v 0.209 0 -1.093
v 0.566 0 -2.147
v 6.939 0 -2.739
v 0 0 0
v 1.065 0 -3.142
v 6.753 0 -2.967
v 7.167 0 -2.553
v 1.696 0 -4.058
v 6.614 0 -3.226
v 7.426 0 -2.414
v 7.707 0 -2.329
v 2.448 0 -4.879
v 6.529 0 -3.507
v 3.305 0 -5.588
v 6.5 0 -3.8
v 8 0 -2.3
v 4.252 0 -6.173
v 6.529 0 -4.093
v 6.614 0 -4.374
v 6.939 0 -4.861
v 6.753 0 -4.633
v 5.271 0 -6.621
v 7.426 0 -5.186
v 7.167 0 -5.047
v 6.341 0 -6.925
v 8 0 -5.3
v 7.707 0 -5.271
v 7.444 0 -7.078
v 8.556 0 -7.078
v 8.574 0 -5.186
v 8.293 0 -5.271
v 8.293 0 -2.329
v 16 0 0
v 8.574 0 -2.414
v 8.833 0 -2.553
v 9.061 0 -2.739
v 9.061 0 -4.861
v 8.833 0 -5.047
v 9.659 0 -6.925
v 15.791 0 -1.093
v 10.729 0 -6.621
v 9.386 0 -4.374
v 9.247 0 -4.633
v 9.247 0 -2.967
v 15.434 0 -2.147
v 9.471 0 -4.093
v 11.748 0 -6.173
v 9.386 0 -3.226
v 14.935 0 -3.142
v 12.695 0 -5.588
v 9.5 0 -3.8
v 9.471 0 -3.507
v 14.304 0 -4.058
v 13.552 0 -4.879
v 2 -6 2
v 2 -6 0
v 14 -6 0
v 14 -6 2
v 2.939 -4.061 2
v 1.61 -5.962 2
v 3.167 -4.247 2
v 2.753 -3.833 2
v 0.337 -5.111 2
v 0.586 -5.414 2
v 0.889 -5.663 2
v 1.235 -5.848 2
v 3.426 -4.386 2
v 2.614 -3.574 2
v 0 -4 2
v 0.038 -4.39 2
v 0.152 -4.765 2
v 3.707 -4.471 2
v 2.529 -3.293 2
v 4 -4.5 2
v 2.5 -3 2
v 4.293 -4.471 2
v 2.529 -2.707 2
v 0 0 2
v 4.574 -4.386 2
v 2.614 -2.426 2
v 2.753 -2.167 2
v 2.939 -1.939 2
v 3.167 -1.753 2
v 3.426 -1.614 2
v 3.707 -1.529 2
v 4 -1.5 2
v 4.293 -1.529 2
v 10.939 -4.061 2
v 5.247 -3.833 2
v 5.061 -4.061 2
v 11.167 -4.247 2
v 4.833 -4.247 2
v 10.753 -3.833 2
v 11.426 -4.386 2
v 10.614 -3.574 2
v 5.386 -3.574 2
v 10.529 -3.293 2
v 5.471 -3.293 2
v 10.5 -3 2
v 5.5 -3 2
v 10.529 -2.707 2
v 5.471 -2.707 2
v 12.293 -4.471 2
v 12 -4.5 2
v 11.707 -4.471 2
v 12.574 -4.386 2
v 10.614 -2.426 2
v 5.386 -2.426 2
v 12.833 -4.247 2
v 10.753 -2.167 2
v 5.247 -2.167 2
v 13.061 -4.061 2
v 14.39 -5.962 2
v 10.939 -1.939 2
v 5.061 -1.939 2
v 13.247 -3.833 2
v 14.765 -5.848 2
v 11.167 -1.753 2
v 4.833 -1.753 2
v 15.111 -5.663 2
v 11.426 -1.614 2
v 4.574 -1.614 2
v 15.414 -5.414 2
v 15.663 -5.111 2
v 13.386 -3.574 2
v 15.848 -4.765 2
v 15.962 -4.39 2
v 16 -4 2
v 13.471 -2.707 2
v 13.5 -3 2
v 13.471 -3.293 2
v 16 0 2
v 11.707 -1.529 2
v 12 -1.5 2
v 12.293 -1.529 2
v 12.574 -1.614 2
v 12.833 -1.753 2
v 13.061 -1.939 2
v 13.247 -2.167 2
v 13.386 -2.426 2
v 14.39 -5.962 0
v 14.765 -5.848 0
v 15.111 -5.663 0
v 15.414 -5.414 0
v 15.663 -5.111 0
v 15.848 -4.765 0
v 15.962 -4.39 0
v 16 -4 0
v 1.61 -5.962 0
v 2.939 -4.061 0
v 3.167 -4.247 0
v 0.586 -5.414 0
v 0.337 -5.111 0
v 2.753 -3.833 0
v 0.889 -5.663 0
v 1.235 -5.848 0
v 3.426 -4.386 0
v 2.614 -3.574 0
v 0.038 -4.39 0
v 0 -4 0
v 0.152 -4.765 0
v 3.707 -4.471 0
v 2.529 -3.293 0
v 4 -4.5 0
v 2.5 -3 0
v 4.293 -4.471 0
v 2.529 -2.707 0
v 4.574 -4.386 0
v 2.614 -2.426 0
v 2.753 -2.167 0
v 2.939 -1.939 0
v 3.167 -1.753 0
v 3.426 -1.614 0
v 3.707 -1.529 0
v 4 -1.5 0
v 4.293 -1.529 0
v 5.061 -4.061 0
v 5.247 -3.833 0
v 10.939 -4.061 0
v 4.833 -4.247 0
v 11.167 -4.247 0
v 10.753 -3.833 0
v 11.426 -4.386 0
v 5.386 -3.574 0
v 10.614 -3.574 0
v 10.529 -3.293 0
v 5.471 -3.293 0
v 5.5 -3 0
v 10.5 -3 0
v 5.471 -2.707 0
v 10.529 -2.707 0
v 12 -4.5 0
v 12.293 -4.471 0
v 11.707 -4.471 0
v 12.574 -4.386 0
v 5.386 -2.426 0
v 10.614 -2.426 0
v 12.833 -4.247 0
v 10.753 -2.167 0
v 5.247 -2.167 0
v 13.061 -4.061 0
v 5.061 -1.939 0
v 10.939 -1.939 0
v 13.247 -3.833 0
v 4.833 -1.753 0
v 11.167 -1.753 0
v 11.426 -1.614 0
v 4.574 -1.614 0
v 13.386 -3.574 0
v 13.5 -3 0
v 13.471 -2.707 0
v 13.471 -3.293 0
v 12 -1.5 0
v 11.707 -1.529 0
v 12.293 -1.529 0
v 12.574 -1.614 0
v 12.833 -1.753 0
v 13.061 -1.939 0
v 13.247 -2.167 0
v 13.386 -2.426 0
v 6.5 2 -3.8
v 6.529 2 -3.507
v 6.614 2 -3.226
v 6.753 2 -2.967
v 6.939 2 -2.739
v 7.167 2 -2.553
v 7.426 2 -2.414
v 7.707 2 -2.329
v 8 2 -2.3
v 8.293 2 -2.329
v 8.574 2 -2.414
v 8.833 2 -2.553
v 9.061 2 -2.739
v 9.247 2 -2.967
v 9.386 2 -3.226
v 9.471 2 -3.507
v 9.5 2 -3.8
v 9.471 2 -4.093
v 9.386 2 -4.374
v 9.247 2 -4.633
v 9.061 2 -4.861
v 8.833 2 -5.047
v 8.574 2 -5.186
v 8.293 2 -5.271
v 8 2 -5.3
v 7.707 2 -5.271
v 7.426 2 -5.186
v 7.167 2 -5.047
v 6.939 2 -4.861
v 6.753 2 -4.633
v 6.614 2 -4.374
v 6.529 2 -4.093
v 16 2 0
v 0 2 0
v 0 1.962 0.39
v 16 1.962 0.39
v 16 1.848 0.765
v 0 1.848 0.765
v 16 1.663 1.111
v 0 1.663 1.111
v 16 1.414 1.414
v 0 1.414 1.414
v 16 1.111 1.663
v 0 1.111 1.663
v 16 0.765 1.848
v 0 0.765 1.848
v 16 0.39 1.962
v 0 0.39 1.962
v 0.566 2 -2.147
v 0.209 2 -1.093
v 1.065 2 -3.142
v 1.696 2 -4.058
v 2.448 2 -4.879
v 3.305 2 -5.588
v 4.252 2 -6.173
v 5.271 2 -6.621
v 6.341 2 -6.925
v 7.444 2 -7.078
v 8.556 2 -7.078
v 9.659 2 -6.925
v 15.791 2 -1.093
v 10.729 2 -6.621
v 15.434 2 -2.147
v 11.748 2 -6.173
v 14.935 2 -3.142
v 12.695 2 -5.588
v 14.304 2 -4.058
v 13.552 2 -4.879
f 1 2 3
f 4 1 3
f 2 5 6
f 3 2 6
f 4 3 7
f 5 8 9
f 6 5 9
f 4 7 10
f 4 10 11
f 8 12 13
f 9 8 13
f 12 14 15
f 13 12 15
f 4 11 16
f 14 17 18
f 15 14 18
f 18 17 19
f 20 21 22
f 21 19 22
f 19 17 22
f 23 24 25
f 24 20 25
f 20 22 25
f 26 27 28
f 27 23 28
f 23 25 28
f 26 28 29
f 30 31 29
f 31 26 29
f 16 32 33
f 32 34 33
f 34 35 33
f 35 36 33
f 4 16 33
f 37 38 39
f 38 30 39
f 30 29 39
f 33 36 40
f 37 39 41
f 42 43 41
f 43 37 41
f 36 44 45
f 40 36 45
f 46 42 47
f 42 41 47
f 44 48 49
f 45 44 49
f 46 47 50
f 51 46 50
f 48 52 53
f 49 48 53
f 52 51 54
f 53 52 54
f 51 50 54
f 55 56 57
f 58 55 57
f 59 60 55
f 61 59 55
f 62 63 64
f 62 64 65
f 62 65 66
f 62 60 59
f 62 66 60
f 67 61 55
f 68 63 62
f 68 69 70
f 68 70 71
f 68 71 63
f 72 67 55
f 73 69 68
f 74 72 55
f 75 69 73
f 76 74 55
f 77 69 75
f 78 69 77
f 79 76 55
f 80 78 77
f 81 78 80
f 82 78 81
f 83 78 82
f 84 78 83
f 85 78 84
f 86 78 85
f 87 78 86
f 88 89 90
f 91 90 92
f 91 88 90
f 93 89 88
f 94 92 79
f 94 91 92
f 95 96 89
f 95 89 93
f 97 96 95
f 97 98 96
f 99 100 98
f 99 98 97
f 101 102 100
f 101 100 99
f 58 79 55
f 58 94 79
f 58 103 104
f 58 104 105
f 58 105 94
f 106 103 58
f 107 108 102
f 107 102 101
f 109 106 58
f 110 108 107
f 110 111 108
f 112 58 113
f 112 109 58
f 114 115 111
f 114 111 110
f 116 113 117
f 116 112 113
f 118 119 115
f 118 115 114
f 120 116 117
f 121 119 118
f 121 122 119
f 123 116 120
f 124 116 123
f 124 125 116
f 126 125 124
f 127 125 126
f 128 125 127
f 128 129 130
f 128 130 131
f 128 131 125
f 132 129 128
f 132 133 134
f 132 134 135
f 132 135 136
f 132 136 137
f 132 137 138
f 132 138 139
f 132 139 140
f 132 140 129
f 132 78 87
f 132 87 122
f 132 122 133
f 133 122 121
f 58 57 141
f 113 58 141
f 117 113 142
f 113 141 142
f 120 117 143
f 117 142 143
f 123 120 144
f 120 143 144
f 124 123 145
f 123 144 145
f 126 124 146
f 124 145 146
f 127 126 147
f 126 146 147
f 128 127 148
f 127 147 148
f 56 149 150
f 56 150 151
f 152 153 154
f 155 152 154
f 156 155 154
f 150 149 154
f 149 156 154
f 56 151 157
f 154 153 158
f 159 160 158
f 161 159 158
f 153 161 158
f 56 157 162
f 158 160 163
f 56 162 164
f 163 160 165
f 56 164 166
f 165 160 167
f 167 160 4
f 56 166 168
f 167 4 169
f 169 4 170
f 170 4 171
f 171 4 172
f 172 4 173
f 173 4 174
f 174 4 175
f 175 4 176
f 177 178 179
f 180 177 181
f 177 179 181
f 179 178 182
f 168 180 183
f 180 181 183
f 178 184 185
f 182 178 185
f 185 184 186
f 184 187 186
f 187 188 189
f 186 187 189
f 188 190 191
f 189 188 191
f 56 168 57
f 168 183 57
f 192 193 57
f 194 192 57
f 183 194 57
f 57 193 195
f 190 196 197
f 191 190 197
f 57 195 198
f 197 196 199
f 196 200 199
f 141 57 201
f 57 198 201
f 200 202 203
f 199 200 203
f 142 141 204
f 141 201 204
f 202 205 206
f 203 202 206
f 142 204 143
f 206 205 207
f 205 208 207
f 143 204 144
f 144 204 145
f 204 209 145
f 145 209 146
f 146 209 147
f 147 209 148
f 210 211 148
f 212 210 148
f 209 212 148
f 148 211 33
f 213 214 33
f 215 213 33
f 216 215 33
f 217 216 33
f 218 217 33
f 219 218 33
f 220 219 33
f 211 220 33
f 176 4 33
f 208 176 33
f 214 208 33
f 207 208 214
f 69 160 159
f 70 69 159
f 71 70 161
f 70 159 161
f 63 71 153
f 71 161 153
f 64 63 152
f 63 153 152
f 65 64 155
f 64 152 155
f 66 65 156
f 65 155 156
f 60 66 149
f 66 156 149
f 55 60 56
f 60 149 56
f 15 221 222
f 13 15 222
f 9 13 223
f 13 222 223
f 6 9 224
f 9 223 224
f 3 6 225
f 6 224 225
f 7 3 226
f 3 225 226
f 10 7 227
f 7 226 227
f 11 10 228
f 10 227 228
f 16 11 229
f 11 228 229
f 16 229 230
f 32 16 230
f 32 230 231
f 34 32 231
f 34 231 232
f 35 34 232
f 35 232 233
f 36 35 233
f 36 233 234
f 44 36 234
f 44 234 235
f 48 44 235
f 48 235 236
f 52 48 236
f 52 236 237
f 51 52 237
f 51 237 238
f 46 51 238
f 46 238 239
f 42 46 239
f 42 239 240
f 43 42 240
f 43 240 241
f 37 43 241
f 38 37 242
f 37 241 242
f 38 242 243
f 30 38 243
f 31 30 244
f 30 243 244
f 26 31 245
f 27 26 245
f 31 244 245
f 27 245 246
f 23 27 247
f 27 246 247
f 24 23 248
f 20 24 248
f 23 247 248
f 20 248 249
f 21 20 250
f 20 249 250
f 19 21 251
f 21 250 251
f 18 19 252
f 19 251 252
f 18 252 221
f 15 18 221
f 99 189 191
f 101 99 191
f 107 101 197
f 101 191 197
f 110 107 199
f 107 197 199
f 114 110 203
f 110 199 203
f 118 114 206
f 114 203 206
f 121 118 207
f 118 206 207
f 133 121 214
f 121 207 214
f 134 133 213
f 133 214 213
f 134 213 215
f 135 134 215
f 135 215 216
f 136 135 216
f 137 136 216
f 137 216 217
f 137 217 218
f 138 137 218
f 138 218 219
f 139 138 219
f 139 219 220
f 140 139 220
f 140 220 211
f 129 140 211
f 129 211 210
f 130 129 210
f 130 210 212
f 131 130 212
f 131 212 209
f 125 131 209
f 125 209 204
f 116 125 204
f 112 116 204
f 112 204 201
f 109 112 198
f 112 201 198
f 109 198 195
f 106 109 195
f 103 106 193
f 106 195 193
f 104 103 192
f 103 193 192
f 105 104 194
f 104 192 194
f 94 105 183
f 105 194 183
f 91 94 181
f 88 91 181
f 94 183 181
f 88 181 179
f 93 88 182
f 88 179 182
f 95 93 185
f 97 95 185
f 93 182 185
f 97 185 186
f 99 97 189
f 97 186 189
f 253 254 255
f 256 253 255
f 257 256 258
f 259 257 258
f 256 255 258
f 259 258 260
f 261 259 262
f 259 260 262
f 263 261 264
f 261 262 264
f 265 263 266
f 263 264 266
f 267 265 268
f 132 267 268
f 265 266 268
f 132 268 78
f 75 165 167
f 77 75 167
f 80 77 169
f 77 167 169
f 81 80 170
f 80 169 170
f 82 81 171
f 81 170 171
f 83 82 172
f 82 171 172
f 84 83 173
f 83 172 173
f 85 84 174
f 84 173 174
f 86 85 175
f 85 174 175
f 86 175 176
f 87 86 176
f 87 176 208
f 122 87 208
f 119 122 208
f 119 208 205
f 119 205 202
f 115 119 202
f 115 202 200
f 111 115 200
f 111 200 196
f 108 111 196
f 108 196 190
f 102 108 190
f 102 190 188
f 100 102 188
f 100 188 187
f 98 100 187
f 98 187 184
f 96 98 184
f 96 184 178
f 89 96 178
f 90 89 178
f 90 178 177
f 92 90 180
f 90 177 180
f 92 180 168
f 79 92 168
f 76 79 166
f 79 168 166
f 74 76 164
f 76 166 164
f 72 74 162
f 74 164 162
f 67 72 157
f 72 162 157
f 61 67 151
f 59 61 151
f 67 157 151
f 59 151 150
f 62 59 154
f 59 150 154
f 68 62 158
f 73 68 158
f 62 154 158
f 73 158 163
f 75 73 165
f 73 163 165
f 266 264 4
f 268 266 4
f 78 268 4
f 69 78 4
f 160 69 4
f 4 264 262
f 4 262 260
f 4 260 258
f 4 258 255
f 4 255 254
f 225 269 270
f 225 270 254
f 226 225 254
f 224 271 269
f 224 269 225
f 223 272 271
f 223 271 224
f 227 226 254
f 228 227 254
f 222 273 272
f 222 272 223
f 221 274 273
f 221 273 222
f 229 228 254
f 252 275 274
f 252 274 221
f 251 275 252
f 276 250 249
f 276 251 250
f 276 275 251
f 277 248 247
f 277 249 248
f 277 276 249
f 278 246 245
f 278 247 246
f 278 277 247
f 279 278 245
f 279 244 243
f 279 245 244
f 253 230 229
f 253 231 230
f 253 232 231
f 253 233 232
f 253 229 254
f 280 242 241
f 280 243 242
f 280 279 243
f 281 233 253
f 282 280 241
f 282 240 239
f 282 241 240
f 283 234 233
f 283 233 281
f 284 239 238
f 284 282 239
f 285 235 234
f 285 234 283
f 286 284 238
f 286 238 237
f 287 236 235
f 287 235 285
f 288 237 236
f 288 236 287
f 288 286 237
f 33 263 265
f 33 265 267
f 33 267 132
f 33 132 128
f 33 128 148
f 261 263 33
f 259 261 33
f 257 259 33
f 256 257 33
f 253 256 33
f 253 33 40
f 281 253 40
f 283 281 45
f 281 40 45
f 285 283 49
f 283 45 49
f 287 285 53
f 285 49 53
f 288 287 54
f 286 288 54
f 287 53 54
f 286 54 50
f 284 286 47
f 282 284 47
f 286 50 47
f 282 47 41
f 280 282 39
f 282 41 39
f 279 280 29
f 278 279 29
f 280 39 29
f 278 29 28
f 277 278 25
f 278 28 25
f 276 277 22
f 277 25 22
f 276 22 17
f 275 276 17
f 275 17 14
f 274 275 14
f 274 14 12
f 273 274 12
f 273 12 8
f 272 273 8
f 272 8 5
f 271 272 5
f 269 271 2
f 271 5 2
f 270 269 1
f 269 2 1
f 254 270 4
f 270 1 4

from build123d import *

# Parameters (mm, degrees)
BOSS_EXTRUDE1_DEPTH     = 2
BOSS_EXTRUDE2_DEPTH     = 2
SKETCH10_R              = 1.5
CORTAR_EXTRUIR1_DEPTH   = 10
CROQUIS1_R              = 1.5
CORTAR_EXTRUIR2_DEPTH   = 10
SALIENTE_EXTRUIR1_DEPTH = 16


with BuildPart() as part:
    # Sketch1 → Boss-Extrude1 (new body)
    with BuildSketch(Plane.XY):
        with BuildLine():
            Line((0, 0), (0, -4))
            ThreePointArc((0, -4), (0.585786438, -5.414213562), (2, -6))
            Line((2, -6), (14, -6))
            ThreePointArc((14, -6), (15.414213562, -5.414213562), (16, -4))
            Line((16, -4), (16, 0))
            Line((16, 0), (0, 0))
        make_face()
    extrude(amount=BOSS_EXTRUDE1_DEPTH)

    # Sketch10 → Cortar-Extruir1 (cut)
    with BuildSketch(Plane(origin=(0, 0, 0), x_dir=(-1, 0, 0), z_dir=(0, 0, -1))):
        with Locations((-12, -3)):
            Circle(SKETCH10_R)
        with Locations((-4, -3)):
            Circle(SKETCH10_R)
    extrude(amount=-CORTAR_EXTRUIR1_DEPTH, mode=Mode.SUBTRACT)



with BuildPart() as body_2:
    # Sketch5 → Boss-Extrude2 (new body)
    with BuildSketch(Plane(origin=(0, 0, 0), x_dir=(1, 0, 0), z_dir=(0, 1, 0))):
        with BuildLine():
            Line((0, 0), (16, 0))
            ThreePointArc((16, 0), (8, 7.097527245), (0, 0))
        make_face()
    extrude(amount=BOSS_EXTRUDE2_DEPTH)

    # Croquis1 → Cortar-Extruir2 (cut)
    with BuildSketch(Plane(origin=(0, 2, 0), x_dir=(1, 0, 0), z_dir=(0, 1, 0))):
        with Locations(Location((8, 3.8, 0), (0, 0, 180))):
            Circle(CROQUIS1_R)
    extrude(amount=-CORTAR_EXTRUIR2_DEPTH, mode=Mode.SUBTRACT)


with BuildPart() as part_1:
    add(part.part)

    add(body_2.part)  # Saliente-Extruir1 merges body 2
    # Croquis2 → Saliente-Extruir1 (add)
    with BuildSketch(Plane.ZY):
        with BuildLine():
            Line((2, 0), (0, 0))
            Line((0, 0), (0, 2))
            ThreePointArc((0, 2), (1.414213562, 1.414213562), (2, 0))
        make_face()
    extrude(amount=-SALIENTE_EXTRUIR1_DEPTH)


solid = part_1.part
